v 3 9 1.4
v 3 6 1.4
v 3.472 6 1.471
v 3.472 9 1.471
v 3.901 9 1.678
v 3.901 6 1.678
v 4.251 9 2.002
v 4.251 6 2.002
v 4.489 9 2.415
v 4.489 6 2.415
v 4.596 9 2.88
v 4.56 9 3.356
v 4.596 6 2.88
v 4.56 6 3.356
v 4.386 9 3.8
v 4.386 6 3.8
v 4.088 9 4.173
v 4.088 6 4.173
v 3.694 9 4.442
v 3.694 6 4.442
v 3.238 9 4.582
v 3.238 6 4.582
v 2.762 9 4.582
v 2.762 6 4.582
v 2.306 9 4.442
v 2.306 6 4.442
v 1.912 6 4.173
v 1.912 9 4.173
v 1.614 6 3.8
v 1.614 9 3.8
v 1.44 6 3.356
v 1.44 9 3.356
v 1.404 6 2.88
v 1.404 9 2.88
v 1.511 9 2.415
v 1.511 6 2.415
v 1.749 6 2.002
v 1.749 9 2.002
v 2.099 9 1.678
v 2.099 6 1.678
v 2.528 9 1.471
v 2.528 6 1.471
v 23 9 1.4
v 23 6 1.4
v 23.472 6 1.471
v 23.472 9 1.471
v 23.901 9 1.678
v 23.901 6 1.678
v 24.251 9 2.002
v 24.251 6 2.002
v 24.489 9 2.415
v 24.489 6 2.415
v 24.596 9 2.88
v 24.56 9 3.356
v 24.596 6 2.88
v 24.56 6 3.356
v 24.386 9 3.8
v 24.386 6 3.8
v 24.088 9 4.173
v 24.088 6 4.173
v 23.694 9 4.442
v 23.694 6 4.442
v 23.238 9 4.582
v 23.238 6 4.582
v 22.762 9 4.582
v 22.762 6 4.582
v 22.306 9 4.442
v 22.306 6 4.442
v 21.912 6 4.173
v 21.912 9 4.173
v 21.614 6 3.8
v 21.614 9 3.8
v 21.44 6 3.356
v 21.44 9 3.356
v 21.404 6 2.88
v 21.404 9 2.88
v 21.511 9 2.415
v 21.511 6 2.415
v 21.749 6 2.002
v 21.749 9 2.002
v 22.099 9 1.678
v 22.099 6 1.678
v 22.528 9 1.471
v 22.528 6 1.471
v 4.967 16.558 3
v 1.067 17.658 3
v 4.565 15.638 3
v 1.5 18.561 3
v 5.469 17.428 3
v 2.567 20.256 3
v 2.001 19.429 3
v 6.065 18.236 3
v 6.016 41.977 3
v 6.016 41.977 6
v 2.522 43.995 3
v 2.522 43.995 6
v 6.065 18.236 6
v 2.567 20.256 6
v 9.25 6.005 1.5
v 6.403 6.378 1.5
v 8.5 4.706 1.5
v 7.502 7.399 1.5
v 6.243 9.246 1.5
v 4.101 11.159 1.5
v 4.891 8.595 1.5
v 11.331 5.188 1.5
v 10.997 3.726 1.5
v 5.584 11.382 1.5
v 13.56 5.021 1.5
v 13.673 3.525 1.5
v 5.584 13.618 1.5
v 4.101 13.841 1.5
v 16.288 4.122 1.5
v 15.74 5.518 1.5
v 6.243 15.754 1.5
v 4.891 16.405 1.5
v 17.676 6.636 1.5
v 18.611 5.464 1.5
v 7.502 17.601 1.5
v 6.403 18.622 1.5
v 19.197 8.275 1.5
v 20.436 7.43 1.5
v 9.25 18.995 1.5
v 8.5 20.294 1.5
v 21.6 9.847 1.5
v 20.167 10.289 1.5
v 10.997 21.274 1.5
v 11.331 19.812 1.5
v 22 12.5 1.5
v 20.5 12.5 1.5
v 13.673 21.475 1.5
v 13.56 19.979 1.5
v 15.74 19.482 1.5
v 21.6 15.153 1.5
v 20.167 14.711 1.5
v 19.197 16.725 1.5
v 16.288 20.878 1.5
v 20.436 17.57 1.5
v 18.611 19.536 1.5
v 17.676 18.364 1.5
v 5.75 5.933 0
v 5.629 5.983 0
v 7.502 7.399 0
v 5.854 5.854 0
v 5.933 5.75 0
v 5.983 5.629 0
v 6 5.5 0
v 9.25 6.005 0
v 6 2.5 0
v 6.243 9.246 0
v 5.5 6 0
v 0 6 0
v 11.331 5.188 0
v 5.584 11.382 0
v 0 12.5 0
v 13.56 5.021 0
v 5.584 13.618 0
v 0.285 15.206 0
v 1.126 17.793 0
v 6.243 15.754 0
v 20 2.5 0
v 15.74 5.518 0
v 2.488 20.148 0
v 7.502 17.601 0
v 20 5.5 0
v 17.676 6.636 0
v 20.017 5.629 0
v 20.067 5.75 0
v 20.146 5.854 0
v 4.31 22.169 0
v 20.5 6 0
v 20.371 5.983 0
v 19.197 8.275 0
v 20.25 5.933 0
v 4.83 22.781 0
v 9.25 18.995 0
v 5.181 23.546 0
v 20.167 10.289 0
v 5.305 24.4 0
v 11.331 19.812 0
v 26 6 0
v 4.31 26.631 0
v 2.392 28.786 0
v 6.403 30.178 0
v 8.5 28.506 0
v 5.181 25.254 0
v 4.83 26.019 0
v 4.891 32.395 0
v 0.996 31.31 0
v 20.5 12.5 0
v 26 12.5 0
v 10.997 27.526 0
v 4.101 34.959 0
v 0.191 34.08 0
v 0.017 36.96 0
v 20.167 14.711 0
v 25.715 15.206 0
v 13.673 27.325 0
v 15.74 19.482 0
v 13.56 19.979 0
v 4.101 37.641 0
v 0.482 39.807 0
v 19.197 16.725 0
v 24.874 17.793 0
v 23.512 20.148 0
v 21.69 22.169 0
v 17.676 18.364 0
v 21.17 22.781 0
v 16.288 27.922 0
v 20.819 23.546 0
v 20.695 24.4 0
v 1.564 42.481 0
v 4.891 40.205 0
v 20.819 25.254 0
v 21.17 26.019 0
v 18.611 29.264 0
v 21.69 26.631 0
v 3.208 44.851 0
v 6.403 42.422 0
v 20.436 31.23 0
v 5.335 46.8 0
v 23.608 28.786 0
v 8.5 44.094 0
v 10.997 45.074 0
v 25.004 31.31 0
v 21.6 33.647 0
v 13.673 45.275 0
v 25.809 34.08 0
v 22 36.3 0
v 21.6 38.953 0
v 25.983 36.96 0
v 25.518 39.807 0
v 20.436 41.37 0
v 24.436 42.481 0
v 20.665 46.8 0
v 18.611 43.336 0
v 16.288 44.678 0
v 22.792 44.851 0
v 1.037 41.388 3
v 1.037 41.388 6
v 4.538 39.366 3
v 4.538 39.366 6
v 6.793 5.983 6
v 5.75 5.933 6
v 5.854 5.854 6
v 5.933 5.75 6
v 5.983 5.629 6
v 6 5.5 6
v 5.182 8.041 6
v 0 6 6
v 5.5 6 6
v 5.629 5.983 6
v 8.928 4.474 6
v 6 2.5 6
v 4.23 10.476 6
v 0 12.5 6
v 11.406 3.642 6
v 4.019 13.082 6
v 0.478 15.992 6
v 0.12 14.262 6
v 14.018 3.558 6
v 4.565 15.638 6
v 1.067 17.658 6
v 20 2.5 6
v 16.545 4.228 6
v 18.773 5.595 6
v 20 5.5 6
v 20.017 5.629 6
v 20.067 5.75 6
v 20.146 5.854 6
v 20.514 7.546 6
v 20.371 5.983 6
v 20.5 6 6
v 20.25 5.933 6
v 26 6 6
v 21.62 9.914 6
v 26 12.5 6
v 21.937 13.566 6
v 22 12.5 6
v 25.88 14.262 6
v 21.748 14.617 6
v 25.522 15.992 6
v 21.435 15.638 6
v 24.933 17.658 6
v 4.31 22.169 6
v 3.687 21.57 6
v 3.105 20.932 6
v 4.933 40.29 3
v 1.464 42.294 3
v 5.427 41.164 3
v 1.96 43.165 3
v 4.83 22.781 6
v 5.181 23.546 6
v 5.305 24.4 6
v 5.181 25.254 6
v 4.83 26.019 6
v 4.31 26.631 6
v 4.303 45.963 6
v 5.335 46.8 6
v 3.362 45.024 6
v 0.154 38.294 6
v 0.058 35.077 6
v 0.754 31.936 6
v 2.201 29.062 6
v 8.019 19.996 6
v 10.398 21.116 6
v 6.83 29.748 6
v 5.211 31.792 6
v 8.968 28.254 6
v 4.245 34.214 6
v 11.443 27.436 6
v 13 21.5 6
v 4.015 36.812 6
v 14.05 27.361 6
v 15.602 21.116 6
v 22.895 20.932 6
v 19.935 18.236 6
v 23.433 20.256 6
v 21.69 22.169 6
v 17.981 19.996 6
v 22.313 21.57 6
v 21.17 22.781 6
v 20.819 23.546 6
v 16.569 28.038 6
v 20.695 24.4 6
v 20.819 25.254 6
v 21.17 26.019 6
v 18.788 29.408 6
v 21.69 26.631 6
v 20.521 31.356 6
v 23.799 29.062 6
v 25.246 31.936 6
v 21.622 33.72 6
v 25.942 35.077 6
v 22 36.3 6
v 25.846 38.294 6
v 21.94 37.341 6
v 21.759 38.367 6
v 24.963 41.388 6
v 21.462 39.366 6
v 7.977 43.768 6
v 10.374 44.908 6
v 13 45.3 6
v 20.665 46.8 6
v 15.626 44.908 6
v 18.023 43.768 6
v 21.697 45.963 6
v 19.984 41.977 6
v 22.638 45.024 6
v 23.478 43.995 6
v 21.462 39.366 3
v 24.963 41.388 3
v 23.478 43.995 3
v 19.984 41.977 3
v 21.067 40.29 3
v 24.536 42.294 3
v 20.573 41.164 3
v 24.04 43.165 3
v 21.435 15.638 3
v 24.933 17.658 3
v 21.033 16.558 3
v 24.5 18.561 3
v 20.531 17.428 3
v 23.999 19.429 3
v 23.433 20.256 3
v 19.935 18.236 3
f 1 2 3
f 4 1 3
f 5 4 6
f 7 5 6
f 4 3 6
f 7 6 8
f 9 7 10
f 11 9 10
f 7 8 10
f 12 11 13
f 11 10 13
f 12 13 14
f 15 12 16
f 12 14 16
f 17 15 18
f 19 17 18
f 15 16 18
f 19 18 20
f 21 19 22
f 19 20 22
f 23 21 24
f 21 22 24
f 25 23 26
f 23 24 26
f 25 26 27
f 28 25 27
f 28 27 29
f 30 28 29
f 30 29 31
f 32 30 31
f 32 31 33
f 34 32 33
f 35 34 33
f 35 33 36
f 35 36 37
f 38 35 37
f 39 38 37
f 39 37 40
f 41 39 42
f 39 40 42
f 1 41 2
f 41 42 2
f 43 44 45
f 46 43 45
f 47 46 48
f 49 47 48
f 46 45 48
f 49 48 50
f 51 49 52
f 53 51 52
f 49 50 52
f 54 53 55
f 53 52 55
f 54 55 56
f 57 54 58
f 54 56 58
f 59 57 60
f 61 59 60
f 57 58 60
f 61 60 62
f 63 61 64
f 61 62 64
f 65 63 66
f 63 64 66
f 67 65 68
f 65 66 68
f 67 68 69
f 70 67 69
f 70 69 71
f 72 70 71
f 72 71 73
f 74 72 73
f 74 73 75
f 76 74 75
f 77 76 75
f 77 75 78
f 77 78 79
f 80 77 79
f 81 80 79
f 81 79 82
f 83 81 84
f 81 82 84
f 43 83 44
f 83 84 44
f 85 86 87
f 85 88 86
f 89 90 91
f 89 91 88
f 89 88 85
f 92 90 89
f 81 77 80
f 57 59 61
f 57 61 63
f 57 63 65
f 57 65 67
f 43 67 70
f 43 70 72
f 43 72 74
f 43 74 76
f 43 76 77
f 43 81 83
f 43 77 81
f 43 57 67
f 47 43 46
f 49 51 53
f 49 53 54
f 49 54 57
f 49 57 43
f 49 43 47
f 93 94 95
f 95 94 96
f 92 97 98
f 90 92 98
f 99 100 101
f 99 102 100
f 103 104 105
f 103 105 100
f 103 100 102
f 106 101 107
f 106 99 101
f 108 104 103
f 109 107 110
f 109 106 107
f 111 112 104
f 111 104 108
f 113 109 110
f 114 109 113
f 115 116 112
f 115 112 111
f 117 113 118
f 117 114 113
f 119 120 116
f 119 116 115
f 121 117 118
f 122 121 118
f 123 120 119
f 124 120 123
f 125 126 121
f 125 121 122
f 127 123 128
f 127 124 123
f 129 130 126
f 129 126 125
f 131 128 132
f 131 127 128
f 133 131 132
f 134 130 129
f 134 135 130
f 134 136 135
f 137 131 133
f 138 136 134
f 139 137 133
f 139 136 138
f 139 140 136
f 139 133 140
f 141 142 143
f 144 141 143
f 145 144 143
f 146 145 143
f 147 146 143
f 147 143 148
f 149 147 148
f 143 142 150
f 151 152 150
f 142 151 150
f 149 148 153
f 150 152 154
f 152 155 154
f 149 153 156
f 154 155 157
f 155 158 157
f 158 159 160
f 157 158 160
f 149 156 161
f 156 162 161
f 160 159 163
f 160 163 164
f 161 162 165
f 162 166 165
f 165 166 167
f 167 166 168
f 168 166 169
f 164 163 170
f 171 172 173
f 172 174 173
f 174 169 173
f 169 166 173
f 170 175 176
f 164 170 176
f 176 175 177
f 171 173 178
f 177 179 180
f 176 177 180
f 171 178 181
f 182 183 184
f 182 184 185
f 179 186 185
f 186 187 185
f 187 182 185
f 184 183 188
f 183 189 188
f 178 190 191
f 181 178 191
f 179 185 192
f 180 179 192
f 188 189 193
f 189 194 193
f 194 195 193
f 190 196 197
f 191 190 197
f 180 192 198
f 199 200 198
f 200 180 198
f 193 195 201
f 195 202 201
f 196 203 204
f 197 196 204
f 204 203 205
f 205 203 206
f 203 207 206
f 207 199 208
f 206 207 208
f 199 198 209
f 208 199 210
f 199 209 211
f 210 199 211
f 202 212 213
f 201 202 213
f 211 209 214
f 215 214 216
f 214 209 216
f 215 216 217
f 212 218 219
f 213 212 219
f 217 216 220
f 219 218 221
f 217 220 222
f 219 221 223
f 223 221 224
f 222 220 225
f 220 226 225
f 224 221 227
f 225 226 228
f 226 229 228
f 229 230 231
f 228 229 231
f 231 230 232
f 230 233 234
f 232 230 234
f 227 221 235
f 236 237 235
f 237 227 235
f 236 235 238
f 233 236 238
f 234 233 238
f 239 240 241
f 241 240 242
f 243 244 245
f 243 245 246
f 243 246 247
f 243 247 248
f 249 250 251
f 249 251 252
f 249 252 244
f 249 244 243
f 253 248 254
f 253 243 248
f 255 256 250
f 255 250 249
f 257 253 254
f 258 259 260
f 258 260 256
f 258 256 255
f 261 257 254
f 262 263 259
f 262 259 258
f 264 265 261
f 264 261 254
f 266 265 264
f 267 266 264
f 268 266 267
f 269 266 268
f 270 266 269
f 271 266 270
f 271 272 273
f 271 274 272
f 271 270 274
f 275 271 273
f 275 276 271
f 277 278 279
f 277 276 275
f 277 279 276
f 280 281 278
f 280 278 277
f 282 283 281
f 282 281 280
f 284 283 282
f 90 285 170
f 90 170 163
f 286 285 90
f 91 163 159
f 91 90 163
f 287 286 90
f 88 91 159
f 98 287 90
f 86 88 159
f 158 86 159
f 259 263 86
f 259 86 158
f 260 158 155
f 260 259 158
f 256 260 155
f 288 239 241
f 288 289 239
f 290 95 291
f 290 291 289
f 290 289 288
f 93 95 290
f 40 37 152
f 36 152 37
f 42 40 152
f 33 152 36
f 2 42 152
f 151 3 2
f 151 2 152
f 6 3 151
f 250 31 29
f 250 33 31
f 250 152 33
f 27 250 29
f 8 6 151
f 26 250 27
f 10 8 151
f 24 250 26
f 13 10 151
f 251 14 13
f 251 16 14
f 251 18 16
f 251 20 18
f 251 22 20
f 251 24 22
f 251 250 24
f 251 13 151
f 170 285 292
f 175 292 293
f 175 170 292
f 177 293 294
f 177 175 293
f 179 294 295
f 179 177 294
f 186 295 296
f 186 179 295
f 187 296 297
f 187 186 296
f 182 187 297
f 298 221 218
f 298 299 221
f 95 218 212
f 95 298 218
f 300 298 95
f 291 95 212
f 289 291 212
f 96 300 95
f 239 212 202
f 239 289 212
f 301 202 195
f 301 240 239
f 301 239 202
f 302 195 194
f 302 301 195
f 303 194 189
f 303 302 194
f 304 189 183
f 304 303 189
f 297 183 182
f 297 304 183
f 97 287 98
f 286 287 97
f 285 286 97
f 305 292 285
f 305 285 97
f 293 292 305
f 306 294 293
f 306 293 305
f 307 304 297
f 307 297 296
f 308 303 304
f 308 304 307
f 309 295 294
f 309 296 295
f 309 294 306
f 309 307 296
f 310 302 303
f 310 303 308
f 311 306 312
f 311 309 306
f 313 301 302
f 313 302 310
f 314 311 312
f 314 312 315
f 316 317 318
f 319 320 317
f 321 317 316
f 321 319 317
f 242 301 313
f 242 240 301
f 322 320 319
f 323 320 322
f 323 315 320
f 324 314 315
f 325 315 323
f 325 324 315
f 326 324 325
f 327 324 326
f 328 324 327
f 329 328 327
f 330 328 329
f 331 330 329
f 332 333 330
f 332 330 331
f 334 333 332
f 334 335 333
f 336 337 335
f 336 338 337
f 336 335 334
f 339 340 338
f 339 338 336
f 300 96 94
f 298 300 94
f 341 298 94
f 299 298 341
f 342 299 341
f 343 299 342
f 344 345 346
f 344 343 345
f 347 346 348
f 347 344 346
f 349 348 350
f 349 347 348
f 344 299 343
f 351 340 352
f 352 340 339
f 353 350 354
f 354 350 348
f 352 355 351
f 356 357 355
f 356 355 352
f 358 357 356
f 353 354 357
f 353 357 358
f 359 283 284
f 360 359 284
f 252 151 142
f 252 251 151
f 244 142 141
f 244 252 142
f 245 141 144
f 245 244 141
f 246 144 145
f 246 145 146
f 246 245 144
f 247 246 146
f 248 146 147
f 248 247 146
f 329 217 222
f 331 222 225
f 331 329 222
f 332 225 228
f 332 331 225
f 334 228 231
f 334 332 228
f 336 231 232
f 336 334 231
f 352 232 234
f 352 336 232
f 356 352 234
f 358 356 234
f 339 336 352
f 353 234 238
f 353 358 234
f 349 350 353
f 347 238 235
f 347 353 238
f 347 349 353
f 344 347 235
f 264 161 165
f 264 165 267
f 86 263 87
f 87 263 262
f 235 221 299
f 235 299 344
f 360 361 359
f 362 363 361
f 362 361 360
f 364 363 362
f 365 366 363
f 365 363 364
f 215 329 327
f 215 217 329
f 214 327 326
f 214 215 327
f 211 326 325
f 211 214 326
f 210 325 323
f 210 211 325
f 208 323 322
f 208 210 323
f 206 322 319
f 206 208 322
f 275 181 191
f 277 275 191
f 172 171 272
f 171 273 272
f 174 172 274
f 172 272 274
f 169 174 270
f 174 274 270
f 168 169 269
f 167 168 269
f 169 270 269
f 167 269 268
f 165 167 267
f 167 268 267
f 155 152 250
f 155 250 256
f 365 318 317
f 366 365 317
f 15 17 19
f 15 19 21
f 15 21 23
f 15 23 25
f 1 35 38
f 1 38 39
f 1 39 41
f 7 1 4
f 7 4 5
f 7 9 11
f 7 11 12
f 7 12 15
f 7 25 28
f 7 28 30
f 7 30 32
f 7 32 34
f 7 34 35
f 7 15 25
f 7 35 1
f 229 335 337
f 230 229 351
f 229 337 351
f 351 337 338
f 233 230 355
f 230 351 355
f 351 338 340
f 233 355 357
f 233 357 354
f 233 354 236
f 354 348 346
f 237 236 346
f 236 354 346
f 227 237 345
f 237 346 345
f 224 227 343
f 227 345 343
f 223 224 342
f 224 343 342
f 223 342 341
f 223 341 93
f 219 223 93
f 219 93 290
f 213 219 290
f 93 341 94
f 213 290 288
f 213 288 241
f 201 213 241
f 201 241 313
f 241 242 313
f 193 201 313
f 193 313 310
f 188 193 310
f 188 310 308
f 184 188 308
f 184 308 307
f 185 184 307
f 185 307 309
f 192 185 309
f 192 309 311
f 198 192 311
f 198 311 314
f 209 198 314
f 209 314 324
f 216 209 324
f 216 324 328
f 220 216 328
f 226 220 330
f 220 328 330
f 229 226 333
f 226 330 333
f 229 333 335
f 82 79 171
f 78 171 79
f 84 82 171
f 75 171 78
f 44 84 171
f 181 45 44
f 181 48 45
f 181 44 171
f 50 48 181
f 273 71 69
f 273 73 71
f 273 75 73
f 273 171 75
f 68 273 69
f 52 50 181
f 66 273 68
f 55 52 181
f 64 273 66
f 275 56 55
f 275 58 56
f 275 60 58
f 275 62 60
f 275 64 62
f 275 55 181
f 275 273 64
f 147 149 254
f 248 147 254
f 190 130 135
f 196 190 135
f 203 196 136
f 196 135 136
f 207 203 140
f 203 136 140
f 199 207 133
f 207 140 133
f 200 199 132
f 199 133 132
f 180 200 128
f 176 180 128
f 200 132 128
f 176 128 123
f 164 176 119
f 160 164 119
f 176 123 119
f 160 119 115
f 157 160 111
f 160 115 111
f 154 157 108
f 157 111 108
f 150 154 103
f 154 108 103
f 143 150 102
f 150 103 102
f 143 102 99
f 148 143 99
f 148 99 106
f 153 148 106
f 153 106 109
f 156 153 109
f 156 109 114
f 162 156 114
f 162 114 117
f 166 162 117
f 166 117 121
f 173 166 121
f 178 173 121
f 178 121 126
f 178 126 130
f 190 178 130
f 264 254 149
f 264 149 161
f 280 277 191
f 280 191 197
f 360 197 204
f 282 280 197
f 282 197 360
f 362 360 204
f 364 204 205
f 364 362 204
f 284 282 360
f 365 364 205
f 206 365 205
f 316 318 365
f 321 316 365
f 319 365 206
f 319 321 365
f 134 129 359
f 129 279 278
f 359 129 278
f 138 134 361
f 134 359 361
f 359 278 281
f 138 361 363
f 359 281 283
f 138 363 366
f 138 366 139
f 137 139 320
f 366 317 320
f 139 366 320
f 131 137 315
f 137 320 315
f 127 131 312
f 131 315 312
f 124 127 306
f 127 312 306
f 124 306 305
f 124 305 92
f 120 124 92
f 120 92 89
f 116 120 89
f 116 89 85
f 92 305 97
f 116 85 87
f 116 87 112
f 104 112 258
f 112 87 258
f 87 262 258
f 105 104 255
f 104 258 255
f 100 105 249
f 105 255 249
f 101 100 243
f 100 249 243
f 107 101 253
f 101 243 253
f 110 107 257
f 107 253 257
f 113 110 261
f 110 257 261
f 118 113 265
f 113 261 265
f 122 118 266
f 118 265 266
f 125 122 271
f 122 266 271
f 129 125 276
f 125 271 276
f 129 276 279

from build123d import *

# Parameters (mm, degrees)
SKETCH_1_W          = 26
SKETCH_1_H          = 46.8
EXTRUDE_1_DEPTH     = 6
SKETCH_2_R          = 9
SKETCH_2_R_2        = 7.5
CUT_EXTRUDE_1_DEPTH = 54.872441935
SKETCH_3_W          = 26
SKETCH_3_H          = 2.5
CUT_EXTRUDE_2_DEPTH = 54.872441935
CHAMFER_1_SIZE      = 5
SKETCH_4_W          = 6
SKETCH_4_H          = 6
CUT_EXTRUDE_3_DEPTH = 3.5
SKETCH_5_R          = 1.6
CUT_EXTRUDE_4_DEPTH = 3
FILLET_1_R          = 0.5
SKETCH_6_OUTSIDE_W  = 38.344
SKETCH_6_OUTSIDE_H  = 56.644
CUT_EXTRUDE_5_DEPTH = 54.872441935
FILLET_2_R          = 3
SKETCH_7_R          = 9
CUT_EXTRUDE_6_DEPTH = 4.5
CUT_EXTRUDE_7_DEPTH = 3


with BuildPart() as part:
    # 草图1 → 凸台-拉伸1 (new body)
    with BuildSketch(Plane.XY):
        with Locations((13, 23.4)):
            Rectangle(SKETCH_1_W, SKETCH_1_H)
    extrude(amount=EXTRUDE_1_DEPTH)

    # 草图2 → 切除-拉伸1 (cut, through all)
    with BuildSketch(Plane.XY.offset(6)):
        with Locations((13, 36.3)):
            Circle(SKETCH_2_R)
        with Locations((13, 12.5)):
            Circle(SKETCH_2_R_2)
    extrude(amount=-CUT_EXTRUDE_1_DEPTH, mode=Mode.SUBTRACT)

    # 草图3 → 切除-拉伸2 (cut, through all)
    with BuildSketch(Plane.XY.offset(6)):
        with Locations((13, 1.25)):
            Rectangle(SKETCH_3_W, SKETCH_3_H)
    extrude(amount=-CUT_EXTRUDE_2_DEPTH, mode=Mode.SUBTRACT)

    # 倒角1
    chamfer_1_edges = [part.edges().sort_by_distance(p)[0] for p in [
        (0, 46.8, 3),
        (26, 46.8, 3),
    ]]
    chamfer(chamfer_1_edges, length=CHAMFER_1_SIZE)

    # 草图4 → 切除-拉伸3 (cut)
    with BuildSketch(Plane.XZ.offset(-2.5)):
        with Locations((3, 3)):
            Rectangle(SKETCH_4_W, SKETCH_4_H)
        with Locations((23, 3)):
            Rectangle(SKETCH_4_W, SKETCH_4_H)
    extrude(amount=-CUT_EXTRUDE_3_DEPTH, mode=Mode.SUBTRACT)

    # 草图5 → 切除-拉伸4 (cut)
    with BuildSketch(Plane.XZ.offset(-6)):
        with Locations(Location((3, 3, 0), (0, 0, 270))):
            Circle(SKETCH_5_R)
        with Locations(Location((23, 3, 0), (0, 0, 270))):
            Circle(SKETCH_5_R)
    extrude(amount=-CUT_EXTRUDE_4_DEPTH, mode=Mode.SUBTRACT)

    # 圆角1
    fillet_1_edges = [part.edges().sort_by_distance(p)[0] for p in [
        (6, 6, 3),
        (20, 6, 3),
    ]]
    fillet(fillet_1_edges, radius=FILLET_1_R)

    # 草图6 outside → 切除-拉伸5 (cut, through all)
    with BuildSketch(Plane.XY.offset(6)):
        with Locations((13, 24.65)):
            Rectangle(SKETCH_6_OUTSIDE_W, SKETCH_6_OUTSIDE_H)
        with BuildLine():
            Line((0, 12.5), (0, 6))
            Line((0, 6), (0, 0))
            Line((0, 0), (26, 0))
            Line((26, 0), (26, 6))
            Line((26, 6), (26, 12.5))
            ThreePointArc((26, 12.5), (23.886599408, 19.605065328), (18.233545643, 24.4))
            ThreePointArc((18.233545643, 24.4), (13, 49.3), (7.766454357, 24.4))
            ThreePointArc((7.766454357, 24.4), (2.113400592, 19.605065328), (0, 12.5))
        make_face(mode=Mode.SUBTRACT)
    extrude(amount=-CUT_EXTRUDE_5_DEPTH, mode=Mode.SUBTRACT)

    # 圆角2
    fillet_2_edges = [part.edges().sort_by_distance(p)[0] for p in [
        (18.233545643, 24.4, 3),
        (7.766454357, 24.4, 3),
    ]]
    fillet(fillet_2_edges, radius=FILLET_2_R)

    # 草图7 → 切除-拉伸6 (cut)
    with BuildSketch(Plane.XY.offset(6)):
        with Locations((13, 12.5)):
            Circle(SKETCH_7_R)
    extrude(amount=-CUT_EXTRUDE_6_DEPTH, mode=Mode.SUBTRACT)

    # 草图8 → 切除-拉伸7 (cut)
    with BuildSketch(Plane.XY.offset(6)):
        Polygon((5.159136754, 39.007700761), (6.659136754, 41.605776972), (1.007687062, 44.868642973), (-0.492312938, 42.270566762), align=None)
        Polygon((7.841745639, 13.746068736), (9.341745639, 16.344144947), (1.5, 20.871578903), (0, 18.273502692), align=None)
        Polygon((24.5, 20.871578903), (16.658254361, 16.344144947), (18.158254361, 13.746068736), (26, 18.273502692), align=None)
        Polygon((24.992312938, 44.868642973), (19.340863246, 41.605776972), (20.840863246, 39.007700761), (26.492312938, 42.270566762), align=None)
    extrude(amount=-CUT_EXTRUDE_7_DEPTH, mode=Mode.SUBTRACT)


solid = part.part
